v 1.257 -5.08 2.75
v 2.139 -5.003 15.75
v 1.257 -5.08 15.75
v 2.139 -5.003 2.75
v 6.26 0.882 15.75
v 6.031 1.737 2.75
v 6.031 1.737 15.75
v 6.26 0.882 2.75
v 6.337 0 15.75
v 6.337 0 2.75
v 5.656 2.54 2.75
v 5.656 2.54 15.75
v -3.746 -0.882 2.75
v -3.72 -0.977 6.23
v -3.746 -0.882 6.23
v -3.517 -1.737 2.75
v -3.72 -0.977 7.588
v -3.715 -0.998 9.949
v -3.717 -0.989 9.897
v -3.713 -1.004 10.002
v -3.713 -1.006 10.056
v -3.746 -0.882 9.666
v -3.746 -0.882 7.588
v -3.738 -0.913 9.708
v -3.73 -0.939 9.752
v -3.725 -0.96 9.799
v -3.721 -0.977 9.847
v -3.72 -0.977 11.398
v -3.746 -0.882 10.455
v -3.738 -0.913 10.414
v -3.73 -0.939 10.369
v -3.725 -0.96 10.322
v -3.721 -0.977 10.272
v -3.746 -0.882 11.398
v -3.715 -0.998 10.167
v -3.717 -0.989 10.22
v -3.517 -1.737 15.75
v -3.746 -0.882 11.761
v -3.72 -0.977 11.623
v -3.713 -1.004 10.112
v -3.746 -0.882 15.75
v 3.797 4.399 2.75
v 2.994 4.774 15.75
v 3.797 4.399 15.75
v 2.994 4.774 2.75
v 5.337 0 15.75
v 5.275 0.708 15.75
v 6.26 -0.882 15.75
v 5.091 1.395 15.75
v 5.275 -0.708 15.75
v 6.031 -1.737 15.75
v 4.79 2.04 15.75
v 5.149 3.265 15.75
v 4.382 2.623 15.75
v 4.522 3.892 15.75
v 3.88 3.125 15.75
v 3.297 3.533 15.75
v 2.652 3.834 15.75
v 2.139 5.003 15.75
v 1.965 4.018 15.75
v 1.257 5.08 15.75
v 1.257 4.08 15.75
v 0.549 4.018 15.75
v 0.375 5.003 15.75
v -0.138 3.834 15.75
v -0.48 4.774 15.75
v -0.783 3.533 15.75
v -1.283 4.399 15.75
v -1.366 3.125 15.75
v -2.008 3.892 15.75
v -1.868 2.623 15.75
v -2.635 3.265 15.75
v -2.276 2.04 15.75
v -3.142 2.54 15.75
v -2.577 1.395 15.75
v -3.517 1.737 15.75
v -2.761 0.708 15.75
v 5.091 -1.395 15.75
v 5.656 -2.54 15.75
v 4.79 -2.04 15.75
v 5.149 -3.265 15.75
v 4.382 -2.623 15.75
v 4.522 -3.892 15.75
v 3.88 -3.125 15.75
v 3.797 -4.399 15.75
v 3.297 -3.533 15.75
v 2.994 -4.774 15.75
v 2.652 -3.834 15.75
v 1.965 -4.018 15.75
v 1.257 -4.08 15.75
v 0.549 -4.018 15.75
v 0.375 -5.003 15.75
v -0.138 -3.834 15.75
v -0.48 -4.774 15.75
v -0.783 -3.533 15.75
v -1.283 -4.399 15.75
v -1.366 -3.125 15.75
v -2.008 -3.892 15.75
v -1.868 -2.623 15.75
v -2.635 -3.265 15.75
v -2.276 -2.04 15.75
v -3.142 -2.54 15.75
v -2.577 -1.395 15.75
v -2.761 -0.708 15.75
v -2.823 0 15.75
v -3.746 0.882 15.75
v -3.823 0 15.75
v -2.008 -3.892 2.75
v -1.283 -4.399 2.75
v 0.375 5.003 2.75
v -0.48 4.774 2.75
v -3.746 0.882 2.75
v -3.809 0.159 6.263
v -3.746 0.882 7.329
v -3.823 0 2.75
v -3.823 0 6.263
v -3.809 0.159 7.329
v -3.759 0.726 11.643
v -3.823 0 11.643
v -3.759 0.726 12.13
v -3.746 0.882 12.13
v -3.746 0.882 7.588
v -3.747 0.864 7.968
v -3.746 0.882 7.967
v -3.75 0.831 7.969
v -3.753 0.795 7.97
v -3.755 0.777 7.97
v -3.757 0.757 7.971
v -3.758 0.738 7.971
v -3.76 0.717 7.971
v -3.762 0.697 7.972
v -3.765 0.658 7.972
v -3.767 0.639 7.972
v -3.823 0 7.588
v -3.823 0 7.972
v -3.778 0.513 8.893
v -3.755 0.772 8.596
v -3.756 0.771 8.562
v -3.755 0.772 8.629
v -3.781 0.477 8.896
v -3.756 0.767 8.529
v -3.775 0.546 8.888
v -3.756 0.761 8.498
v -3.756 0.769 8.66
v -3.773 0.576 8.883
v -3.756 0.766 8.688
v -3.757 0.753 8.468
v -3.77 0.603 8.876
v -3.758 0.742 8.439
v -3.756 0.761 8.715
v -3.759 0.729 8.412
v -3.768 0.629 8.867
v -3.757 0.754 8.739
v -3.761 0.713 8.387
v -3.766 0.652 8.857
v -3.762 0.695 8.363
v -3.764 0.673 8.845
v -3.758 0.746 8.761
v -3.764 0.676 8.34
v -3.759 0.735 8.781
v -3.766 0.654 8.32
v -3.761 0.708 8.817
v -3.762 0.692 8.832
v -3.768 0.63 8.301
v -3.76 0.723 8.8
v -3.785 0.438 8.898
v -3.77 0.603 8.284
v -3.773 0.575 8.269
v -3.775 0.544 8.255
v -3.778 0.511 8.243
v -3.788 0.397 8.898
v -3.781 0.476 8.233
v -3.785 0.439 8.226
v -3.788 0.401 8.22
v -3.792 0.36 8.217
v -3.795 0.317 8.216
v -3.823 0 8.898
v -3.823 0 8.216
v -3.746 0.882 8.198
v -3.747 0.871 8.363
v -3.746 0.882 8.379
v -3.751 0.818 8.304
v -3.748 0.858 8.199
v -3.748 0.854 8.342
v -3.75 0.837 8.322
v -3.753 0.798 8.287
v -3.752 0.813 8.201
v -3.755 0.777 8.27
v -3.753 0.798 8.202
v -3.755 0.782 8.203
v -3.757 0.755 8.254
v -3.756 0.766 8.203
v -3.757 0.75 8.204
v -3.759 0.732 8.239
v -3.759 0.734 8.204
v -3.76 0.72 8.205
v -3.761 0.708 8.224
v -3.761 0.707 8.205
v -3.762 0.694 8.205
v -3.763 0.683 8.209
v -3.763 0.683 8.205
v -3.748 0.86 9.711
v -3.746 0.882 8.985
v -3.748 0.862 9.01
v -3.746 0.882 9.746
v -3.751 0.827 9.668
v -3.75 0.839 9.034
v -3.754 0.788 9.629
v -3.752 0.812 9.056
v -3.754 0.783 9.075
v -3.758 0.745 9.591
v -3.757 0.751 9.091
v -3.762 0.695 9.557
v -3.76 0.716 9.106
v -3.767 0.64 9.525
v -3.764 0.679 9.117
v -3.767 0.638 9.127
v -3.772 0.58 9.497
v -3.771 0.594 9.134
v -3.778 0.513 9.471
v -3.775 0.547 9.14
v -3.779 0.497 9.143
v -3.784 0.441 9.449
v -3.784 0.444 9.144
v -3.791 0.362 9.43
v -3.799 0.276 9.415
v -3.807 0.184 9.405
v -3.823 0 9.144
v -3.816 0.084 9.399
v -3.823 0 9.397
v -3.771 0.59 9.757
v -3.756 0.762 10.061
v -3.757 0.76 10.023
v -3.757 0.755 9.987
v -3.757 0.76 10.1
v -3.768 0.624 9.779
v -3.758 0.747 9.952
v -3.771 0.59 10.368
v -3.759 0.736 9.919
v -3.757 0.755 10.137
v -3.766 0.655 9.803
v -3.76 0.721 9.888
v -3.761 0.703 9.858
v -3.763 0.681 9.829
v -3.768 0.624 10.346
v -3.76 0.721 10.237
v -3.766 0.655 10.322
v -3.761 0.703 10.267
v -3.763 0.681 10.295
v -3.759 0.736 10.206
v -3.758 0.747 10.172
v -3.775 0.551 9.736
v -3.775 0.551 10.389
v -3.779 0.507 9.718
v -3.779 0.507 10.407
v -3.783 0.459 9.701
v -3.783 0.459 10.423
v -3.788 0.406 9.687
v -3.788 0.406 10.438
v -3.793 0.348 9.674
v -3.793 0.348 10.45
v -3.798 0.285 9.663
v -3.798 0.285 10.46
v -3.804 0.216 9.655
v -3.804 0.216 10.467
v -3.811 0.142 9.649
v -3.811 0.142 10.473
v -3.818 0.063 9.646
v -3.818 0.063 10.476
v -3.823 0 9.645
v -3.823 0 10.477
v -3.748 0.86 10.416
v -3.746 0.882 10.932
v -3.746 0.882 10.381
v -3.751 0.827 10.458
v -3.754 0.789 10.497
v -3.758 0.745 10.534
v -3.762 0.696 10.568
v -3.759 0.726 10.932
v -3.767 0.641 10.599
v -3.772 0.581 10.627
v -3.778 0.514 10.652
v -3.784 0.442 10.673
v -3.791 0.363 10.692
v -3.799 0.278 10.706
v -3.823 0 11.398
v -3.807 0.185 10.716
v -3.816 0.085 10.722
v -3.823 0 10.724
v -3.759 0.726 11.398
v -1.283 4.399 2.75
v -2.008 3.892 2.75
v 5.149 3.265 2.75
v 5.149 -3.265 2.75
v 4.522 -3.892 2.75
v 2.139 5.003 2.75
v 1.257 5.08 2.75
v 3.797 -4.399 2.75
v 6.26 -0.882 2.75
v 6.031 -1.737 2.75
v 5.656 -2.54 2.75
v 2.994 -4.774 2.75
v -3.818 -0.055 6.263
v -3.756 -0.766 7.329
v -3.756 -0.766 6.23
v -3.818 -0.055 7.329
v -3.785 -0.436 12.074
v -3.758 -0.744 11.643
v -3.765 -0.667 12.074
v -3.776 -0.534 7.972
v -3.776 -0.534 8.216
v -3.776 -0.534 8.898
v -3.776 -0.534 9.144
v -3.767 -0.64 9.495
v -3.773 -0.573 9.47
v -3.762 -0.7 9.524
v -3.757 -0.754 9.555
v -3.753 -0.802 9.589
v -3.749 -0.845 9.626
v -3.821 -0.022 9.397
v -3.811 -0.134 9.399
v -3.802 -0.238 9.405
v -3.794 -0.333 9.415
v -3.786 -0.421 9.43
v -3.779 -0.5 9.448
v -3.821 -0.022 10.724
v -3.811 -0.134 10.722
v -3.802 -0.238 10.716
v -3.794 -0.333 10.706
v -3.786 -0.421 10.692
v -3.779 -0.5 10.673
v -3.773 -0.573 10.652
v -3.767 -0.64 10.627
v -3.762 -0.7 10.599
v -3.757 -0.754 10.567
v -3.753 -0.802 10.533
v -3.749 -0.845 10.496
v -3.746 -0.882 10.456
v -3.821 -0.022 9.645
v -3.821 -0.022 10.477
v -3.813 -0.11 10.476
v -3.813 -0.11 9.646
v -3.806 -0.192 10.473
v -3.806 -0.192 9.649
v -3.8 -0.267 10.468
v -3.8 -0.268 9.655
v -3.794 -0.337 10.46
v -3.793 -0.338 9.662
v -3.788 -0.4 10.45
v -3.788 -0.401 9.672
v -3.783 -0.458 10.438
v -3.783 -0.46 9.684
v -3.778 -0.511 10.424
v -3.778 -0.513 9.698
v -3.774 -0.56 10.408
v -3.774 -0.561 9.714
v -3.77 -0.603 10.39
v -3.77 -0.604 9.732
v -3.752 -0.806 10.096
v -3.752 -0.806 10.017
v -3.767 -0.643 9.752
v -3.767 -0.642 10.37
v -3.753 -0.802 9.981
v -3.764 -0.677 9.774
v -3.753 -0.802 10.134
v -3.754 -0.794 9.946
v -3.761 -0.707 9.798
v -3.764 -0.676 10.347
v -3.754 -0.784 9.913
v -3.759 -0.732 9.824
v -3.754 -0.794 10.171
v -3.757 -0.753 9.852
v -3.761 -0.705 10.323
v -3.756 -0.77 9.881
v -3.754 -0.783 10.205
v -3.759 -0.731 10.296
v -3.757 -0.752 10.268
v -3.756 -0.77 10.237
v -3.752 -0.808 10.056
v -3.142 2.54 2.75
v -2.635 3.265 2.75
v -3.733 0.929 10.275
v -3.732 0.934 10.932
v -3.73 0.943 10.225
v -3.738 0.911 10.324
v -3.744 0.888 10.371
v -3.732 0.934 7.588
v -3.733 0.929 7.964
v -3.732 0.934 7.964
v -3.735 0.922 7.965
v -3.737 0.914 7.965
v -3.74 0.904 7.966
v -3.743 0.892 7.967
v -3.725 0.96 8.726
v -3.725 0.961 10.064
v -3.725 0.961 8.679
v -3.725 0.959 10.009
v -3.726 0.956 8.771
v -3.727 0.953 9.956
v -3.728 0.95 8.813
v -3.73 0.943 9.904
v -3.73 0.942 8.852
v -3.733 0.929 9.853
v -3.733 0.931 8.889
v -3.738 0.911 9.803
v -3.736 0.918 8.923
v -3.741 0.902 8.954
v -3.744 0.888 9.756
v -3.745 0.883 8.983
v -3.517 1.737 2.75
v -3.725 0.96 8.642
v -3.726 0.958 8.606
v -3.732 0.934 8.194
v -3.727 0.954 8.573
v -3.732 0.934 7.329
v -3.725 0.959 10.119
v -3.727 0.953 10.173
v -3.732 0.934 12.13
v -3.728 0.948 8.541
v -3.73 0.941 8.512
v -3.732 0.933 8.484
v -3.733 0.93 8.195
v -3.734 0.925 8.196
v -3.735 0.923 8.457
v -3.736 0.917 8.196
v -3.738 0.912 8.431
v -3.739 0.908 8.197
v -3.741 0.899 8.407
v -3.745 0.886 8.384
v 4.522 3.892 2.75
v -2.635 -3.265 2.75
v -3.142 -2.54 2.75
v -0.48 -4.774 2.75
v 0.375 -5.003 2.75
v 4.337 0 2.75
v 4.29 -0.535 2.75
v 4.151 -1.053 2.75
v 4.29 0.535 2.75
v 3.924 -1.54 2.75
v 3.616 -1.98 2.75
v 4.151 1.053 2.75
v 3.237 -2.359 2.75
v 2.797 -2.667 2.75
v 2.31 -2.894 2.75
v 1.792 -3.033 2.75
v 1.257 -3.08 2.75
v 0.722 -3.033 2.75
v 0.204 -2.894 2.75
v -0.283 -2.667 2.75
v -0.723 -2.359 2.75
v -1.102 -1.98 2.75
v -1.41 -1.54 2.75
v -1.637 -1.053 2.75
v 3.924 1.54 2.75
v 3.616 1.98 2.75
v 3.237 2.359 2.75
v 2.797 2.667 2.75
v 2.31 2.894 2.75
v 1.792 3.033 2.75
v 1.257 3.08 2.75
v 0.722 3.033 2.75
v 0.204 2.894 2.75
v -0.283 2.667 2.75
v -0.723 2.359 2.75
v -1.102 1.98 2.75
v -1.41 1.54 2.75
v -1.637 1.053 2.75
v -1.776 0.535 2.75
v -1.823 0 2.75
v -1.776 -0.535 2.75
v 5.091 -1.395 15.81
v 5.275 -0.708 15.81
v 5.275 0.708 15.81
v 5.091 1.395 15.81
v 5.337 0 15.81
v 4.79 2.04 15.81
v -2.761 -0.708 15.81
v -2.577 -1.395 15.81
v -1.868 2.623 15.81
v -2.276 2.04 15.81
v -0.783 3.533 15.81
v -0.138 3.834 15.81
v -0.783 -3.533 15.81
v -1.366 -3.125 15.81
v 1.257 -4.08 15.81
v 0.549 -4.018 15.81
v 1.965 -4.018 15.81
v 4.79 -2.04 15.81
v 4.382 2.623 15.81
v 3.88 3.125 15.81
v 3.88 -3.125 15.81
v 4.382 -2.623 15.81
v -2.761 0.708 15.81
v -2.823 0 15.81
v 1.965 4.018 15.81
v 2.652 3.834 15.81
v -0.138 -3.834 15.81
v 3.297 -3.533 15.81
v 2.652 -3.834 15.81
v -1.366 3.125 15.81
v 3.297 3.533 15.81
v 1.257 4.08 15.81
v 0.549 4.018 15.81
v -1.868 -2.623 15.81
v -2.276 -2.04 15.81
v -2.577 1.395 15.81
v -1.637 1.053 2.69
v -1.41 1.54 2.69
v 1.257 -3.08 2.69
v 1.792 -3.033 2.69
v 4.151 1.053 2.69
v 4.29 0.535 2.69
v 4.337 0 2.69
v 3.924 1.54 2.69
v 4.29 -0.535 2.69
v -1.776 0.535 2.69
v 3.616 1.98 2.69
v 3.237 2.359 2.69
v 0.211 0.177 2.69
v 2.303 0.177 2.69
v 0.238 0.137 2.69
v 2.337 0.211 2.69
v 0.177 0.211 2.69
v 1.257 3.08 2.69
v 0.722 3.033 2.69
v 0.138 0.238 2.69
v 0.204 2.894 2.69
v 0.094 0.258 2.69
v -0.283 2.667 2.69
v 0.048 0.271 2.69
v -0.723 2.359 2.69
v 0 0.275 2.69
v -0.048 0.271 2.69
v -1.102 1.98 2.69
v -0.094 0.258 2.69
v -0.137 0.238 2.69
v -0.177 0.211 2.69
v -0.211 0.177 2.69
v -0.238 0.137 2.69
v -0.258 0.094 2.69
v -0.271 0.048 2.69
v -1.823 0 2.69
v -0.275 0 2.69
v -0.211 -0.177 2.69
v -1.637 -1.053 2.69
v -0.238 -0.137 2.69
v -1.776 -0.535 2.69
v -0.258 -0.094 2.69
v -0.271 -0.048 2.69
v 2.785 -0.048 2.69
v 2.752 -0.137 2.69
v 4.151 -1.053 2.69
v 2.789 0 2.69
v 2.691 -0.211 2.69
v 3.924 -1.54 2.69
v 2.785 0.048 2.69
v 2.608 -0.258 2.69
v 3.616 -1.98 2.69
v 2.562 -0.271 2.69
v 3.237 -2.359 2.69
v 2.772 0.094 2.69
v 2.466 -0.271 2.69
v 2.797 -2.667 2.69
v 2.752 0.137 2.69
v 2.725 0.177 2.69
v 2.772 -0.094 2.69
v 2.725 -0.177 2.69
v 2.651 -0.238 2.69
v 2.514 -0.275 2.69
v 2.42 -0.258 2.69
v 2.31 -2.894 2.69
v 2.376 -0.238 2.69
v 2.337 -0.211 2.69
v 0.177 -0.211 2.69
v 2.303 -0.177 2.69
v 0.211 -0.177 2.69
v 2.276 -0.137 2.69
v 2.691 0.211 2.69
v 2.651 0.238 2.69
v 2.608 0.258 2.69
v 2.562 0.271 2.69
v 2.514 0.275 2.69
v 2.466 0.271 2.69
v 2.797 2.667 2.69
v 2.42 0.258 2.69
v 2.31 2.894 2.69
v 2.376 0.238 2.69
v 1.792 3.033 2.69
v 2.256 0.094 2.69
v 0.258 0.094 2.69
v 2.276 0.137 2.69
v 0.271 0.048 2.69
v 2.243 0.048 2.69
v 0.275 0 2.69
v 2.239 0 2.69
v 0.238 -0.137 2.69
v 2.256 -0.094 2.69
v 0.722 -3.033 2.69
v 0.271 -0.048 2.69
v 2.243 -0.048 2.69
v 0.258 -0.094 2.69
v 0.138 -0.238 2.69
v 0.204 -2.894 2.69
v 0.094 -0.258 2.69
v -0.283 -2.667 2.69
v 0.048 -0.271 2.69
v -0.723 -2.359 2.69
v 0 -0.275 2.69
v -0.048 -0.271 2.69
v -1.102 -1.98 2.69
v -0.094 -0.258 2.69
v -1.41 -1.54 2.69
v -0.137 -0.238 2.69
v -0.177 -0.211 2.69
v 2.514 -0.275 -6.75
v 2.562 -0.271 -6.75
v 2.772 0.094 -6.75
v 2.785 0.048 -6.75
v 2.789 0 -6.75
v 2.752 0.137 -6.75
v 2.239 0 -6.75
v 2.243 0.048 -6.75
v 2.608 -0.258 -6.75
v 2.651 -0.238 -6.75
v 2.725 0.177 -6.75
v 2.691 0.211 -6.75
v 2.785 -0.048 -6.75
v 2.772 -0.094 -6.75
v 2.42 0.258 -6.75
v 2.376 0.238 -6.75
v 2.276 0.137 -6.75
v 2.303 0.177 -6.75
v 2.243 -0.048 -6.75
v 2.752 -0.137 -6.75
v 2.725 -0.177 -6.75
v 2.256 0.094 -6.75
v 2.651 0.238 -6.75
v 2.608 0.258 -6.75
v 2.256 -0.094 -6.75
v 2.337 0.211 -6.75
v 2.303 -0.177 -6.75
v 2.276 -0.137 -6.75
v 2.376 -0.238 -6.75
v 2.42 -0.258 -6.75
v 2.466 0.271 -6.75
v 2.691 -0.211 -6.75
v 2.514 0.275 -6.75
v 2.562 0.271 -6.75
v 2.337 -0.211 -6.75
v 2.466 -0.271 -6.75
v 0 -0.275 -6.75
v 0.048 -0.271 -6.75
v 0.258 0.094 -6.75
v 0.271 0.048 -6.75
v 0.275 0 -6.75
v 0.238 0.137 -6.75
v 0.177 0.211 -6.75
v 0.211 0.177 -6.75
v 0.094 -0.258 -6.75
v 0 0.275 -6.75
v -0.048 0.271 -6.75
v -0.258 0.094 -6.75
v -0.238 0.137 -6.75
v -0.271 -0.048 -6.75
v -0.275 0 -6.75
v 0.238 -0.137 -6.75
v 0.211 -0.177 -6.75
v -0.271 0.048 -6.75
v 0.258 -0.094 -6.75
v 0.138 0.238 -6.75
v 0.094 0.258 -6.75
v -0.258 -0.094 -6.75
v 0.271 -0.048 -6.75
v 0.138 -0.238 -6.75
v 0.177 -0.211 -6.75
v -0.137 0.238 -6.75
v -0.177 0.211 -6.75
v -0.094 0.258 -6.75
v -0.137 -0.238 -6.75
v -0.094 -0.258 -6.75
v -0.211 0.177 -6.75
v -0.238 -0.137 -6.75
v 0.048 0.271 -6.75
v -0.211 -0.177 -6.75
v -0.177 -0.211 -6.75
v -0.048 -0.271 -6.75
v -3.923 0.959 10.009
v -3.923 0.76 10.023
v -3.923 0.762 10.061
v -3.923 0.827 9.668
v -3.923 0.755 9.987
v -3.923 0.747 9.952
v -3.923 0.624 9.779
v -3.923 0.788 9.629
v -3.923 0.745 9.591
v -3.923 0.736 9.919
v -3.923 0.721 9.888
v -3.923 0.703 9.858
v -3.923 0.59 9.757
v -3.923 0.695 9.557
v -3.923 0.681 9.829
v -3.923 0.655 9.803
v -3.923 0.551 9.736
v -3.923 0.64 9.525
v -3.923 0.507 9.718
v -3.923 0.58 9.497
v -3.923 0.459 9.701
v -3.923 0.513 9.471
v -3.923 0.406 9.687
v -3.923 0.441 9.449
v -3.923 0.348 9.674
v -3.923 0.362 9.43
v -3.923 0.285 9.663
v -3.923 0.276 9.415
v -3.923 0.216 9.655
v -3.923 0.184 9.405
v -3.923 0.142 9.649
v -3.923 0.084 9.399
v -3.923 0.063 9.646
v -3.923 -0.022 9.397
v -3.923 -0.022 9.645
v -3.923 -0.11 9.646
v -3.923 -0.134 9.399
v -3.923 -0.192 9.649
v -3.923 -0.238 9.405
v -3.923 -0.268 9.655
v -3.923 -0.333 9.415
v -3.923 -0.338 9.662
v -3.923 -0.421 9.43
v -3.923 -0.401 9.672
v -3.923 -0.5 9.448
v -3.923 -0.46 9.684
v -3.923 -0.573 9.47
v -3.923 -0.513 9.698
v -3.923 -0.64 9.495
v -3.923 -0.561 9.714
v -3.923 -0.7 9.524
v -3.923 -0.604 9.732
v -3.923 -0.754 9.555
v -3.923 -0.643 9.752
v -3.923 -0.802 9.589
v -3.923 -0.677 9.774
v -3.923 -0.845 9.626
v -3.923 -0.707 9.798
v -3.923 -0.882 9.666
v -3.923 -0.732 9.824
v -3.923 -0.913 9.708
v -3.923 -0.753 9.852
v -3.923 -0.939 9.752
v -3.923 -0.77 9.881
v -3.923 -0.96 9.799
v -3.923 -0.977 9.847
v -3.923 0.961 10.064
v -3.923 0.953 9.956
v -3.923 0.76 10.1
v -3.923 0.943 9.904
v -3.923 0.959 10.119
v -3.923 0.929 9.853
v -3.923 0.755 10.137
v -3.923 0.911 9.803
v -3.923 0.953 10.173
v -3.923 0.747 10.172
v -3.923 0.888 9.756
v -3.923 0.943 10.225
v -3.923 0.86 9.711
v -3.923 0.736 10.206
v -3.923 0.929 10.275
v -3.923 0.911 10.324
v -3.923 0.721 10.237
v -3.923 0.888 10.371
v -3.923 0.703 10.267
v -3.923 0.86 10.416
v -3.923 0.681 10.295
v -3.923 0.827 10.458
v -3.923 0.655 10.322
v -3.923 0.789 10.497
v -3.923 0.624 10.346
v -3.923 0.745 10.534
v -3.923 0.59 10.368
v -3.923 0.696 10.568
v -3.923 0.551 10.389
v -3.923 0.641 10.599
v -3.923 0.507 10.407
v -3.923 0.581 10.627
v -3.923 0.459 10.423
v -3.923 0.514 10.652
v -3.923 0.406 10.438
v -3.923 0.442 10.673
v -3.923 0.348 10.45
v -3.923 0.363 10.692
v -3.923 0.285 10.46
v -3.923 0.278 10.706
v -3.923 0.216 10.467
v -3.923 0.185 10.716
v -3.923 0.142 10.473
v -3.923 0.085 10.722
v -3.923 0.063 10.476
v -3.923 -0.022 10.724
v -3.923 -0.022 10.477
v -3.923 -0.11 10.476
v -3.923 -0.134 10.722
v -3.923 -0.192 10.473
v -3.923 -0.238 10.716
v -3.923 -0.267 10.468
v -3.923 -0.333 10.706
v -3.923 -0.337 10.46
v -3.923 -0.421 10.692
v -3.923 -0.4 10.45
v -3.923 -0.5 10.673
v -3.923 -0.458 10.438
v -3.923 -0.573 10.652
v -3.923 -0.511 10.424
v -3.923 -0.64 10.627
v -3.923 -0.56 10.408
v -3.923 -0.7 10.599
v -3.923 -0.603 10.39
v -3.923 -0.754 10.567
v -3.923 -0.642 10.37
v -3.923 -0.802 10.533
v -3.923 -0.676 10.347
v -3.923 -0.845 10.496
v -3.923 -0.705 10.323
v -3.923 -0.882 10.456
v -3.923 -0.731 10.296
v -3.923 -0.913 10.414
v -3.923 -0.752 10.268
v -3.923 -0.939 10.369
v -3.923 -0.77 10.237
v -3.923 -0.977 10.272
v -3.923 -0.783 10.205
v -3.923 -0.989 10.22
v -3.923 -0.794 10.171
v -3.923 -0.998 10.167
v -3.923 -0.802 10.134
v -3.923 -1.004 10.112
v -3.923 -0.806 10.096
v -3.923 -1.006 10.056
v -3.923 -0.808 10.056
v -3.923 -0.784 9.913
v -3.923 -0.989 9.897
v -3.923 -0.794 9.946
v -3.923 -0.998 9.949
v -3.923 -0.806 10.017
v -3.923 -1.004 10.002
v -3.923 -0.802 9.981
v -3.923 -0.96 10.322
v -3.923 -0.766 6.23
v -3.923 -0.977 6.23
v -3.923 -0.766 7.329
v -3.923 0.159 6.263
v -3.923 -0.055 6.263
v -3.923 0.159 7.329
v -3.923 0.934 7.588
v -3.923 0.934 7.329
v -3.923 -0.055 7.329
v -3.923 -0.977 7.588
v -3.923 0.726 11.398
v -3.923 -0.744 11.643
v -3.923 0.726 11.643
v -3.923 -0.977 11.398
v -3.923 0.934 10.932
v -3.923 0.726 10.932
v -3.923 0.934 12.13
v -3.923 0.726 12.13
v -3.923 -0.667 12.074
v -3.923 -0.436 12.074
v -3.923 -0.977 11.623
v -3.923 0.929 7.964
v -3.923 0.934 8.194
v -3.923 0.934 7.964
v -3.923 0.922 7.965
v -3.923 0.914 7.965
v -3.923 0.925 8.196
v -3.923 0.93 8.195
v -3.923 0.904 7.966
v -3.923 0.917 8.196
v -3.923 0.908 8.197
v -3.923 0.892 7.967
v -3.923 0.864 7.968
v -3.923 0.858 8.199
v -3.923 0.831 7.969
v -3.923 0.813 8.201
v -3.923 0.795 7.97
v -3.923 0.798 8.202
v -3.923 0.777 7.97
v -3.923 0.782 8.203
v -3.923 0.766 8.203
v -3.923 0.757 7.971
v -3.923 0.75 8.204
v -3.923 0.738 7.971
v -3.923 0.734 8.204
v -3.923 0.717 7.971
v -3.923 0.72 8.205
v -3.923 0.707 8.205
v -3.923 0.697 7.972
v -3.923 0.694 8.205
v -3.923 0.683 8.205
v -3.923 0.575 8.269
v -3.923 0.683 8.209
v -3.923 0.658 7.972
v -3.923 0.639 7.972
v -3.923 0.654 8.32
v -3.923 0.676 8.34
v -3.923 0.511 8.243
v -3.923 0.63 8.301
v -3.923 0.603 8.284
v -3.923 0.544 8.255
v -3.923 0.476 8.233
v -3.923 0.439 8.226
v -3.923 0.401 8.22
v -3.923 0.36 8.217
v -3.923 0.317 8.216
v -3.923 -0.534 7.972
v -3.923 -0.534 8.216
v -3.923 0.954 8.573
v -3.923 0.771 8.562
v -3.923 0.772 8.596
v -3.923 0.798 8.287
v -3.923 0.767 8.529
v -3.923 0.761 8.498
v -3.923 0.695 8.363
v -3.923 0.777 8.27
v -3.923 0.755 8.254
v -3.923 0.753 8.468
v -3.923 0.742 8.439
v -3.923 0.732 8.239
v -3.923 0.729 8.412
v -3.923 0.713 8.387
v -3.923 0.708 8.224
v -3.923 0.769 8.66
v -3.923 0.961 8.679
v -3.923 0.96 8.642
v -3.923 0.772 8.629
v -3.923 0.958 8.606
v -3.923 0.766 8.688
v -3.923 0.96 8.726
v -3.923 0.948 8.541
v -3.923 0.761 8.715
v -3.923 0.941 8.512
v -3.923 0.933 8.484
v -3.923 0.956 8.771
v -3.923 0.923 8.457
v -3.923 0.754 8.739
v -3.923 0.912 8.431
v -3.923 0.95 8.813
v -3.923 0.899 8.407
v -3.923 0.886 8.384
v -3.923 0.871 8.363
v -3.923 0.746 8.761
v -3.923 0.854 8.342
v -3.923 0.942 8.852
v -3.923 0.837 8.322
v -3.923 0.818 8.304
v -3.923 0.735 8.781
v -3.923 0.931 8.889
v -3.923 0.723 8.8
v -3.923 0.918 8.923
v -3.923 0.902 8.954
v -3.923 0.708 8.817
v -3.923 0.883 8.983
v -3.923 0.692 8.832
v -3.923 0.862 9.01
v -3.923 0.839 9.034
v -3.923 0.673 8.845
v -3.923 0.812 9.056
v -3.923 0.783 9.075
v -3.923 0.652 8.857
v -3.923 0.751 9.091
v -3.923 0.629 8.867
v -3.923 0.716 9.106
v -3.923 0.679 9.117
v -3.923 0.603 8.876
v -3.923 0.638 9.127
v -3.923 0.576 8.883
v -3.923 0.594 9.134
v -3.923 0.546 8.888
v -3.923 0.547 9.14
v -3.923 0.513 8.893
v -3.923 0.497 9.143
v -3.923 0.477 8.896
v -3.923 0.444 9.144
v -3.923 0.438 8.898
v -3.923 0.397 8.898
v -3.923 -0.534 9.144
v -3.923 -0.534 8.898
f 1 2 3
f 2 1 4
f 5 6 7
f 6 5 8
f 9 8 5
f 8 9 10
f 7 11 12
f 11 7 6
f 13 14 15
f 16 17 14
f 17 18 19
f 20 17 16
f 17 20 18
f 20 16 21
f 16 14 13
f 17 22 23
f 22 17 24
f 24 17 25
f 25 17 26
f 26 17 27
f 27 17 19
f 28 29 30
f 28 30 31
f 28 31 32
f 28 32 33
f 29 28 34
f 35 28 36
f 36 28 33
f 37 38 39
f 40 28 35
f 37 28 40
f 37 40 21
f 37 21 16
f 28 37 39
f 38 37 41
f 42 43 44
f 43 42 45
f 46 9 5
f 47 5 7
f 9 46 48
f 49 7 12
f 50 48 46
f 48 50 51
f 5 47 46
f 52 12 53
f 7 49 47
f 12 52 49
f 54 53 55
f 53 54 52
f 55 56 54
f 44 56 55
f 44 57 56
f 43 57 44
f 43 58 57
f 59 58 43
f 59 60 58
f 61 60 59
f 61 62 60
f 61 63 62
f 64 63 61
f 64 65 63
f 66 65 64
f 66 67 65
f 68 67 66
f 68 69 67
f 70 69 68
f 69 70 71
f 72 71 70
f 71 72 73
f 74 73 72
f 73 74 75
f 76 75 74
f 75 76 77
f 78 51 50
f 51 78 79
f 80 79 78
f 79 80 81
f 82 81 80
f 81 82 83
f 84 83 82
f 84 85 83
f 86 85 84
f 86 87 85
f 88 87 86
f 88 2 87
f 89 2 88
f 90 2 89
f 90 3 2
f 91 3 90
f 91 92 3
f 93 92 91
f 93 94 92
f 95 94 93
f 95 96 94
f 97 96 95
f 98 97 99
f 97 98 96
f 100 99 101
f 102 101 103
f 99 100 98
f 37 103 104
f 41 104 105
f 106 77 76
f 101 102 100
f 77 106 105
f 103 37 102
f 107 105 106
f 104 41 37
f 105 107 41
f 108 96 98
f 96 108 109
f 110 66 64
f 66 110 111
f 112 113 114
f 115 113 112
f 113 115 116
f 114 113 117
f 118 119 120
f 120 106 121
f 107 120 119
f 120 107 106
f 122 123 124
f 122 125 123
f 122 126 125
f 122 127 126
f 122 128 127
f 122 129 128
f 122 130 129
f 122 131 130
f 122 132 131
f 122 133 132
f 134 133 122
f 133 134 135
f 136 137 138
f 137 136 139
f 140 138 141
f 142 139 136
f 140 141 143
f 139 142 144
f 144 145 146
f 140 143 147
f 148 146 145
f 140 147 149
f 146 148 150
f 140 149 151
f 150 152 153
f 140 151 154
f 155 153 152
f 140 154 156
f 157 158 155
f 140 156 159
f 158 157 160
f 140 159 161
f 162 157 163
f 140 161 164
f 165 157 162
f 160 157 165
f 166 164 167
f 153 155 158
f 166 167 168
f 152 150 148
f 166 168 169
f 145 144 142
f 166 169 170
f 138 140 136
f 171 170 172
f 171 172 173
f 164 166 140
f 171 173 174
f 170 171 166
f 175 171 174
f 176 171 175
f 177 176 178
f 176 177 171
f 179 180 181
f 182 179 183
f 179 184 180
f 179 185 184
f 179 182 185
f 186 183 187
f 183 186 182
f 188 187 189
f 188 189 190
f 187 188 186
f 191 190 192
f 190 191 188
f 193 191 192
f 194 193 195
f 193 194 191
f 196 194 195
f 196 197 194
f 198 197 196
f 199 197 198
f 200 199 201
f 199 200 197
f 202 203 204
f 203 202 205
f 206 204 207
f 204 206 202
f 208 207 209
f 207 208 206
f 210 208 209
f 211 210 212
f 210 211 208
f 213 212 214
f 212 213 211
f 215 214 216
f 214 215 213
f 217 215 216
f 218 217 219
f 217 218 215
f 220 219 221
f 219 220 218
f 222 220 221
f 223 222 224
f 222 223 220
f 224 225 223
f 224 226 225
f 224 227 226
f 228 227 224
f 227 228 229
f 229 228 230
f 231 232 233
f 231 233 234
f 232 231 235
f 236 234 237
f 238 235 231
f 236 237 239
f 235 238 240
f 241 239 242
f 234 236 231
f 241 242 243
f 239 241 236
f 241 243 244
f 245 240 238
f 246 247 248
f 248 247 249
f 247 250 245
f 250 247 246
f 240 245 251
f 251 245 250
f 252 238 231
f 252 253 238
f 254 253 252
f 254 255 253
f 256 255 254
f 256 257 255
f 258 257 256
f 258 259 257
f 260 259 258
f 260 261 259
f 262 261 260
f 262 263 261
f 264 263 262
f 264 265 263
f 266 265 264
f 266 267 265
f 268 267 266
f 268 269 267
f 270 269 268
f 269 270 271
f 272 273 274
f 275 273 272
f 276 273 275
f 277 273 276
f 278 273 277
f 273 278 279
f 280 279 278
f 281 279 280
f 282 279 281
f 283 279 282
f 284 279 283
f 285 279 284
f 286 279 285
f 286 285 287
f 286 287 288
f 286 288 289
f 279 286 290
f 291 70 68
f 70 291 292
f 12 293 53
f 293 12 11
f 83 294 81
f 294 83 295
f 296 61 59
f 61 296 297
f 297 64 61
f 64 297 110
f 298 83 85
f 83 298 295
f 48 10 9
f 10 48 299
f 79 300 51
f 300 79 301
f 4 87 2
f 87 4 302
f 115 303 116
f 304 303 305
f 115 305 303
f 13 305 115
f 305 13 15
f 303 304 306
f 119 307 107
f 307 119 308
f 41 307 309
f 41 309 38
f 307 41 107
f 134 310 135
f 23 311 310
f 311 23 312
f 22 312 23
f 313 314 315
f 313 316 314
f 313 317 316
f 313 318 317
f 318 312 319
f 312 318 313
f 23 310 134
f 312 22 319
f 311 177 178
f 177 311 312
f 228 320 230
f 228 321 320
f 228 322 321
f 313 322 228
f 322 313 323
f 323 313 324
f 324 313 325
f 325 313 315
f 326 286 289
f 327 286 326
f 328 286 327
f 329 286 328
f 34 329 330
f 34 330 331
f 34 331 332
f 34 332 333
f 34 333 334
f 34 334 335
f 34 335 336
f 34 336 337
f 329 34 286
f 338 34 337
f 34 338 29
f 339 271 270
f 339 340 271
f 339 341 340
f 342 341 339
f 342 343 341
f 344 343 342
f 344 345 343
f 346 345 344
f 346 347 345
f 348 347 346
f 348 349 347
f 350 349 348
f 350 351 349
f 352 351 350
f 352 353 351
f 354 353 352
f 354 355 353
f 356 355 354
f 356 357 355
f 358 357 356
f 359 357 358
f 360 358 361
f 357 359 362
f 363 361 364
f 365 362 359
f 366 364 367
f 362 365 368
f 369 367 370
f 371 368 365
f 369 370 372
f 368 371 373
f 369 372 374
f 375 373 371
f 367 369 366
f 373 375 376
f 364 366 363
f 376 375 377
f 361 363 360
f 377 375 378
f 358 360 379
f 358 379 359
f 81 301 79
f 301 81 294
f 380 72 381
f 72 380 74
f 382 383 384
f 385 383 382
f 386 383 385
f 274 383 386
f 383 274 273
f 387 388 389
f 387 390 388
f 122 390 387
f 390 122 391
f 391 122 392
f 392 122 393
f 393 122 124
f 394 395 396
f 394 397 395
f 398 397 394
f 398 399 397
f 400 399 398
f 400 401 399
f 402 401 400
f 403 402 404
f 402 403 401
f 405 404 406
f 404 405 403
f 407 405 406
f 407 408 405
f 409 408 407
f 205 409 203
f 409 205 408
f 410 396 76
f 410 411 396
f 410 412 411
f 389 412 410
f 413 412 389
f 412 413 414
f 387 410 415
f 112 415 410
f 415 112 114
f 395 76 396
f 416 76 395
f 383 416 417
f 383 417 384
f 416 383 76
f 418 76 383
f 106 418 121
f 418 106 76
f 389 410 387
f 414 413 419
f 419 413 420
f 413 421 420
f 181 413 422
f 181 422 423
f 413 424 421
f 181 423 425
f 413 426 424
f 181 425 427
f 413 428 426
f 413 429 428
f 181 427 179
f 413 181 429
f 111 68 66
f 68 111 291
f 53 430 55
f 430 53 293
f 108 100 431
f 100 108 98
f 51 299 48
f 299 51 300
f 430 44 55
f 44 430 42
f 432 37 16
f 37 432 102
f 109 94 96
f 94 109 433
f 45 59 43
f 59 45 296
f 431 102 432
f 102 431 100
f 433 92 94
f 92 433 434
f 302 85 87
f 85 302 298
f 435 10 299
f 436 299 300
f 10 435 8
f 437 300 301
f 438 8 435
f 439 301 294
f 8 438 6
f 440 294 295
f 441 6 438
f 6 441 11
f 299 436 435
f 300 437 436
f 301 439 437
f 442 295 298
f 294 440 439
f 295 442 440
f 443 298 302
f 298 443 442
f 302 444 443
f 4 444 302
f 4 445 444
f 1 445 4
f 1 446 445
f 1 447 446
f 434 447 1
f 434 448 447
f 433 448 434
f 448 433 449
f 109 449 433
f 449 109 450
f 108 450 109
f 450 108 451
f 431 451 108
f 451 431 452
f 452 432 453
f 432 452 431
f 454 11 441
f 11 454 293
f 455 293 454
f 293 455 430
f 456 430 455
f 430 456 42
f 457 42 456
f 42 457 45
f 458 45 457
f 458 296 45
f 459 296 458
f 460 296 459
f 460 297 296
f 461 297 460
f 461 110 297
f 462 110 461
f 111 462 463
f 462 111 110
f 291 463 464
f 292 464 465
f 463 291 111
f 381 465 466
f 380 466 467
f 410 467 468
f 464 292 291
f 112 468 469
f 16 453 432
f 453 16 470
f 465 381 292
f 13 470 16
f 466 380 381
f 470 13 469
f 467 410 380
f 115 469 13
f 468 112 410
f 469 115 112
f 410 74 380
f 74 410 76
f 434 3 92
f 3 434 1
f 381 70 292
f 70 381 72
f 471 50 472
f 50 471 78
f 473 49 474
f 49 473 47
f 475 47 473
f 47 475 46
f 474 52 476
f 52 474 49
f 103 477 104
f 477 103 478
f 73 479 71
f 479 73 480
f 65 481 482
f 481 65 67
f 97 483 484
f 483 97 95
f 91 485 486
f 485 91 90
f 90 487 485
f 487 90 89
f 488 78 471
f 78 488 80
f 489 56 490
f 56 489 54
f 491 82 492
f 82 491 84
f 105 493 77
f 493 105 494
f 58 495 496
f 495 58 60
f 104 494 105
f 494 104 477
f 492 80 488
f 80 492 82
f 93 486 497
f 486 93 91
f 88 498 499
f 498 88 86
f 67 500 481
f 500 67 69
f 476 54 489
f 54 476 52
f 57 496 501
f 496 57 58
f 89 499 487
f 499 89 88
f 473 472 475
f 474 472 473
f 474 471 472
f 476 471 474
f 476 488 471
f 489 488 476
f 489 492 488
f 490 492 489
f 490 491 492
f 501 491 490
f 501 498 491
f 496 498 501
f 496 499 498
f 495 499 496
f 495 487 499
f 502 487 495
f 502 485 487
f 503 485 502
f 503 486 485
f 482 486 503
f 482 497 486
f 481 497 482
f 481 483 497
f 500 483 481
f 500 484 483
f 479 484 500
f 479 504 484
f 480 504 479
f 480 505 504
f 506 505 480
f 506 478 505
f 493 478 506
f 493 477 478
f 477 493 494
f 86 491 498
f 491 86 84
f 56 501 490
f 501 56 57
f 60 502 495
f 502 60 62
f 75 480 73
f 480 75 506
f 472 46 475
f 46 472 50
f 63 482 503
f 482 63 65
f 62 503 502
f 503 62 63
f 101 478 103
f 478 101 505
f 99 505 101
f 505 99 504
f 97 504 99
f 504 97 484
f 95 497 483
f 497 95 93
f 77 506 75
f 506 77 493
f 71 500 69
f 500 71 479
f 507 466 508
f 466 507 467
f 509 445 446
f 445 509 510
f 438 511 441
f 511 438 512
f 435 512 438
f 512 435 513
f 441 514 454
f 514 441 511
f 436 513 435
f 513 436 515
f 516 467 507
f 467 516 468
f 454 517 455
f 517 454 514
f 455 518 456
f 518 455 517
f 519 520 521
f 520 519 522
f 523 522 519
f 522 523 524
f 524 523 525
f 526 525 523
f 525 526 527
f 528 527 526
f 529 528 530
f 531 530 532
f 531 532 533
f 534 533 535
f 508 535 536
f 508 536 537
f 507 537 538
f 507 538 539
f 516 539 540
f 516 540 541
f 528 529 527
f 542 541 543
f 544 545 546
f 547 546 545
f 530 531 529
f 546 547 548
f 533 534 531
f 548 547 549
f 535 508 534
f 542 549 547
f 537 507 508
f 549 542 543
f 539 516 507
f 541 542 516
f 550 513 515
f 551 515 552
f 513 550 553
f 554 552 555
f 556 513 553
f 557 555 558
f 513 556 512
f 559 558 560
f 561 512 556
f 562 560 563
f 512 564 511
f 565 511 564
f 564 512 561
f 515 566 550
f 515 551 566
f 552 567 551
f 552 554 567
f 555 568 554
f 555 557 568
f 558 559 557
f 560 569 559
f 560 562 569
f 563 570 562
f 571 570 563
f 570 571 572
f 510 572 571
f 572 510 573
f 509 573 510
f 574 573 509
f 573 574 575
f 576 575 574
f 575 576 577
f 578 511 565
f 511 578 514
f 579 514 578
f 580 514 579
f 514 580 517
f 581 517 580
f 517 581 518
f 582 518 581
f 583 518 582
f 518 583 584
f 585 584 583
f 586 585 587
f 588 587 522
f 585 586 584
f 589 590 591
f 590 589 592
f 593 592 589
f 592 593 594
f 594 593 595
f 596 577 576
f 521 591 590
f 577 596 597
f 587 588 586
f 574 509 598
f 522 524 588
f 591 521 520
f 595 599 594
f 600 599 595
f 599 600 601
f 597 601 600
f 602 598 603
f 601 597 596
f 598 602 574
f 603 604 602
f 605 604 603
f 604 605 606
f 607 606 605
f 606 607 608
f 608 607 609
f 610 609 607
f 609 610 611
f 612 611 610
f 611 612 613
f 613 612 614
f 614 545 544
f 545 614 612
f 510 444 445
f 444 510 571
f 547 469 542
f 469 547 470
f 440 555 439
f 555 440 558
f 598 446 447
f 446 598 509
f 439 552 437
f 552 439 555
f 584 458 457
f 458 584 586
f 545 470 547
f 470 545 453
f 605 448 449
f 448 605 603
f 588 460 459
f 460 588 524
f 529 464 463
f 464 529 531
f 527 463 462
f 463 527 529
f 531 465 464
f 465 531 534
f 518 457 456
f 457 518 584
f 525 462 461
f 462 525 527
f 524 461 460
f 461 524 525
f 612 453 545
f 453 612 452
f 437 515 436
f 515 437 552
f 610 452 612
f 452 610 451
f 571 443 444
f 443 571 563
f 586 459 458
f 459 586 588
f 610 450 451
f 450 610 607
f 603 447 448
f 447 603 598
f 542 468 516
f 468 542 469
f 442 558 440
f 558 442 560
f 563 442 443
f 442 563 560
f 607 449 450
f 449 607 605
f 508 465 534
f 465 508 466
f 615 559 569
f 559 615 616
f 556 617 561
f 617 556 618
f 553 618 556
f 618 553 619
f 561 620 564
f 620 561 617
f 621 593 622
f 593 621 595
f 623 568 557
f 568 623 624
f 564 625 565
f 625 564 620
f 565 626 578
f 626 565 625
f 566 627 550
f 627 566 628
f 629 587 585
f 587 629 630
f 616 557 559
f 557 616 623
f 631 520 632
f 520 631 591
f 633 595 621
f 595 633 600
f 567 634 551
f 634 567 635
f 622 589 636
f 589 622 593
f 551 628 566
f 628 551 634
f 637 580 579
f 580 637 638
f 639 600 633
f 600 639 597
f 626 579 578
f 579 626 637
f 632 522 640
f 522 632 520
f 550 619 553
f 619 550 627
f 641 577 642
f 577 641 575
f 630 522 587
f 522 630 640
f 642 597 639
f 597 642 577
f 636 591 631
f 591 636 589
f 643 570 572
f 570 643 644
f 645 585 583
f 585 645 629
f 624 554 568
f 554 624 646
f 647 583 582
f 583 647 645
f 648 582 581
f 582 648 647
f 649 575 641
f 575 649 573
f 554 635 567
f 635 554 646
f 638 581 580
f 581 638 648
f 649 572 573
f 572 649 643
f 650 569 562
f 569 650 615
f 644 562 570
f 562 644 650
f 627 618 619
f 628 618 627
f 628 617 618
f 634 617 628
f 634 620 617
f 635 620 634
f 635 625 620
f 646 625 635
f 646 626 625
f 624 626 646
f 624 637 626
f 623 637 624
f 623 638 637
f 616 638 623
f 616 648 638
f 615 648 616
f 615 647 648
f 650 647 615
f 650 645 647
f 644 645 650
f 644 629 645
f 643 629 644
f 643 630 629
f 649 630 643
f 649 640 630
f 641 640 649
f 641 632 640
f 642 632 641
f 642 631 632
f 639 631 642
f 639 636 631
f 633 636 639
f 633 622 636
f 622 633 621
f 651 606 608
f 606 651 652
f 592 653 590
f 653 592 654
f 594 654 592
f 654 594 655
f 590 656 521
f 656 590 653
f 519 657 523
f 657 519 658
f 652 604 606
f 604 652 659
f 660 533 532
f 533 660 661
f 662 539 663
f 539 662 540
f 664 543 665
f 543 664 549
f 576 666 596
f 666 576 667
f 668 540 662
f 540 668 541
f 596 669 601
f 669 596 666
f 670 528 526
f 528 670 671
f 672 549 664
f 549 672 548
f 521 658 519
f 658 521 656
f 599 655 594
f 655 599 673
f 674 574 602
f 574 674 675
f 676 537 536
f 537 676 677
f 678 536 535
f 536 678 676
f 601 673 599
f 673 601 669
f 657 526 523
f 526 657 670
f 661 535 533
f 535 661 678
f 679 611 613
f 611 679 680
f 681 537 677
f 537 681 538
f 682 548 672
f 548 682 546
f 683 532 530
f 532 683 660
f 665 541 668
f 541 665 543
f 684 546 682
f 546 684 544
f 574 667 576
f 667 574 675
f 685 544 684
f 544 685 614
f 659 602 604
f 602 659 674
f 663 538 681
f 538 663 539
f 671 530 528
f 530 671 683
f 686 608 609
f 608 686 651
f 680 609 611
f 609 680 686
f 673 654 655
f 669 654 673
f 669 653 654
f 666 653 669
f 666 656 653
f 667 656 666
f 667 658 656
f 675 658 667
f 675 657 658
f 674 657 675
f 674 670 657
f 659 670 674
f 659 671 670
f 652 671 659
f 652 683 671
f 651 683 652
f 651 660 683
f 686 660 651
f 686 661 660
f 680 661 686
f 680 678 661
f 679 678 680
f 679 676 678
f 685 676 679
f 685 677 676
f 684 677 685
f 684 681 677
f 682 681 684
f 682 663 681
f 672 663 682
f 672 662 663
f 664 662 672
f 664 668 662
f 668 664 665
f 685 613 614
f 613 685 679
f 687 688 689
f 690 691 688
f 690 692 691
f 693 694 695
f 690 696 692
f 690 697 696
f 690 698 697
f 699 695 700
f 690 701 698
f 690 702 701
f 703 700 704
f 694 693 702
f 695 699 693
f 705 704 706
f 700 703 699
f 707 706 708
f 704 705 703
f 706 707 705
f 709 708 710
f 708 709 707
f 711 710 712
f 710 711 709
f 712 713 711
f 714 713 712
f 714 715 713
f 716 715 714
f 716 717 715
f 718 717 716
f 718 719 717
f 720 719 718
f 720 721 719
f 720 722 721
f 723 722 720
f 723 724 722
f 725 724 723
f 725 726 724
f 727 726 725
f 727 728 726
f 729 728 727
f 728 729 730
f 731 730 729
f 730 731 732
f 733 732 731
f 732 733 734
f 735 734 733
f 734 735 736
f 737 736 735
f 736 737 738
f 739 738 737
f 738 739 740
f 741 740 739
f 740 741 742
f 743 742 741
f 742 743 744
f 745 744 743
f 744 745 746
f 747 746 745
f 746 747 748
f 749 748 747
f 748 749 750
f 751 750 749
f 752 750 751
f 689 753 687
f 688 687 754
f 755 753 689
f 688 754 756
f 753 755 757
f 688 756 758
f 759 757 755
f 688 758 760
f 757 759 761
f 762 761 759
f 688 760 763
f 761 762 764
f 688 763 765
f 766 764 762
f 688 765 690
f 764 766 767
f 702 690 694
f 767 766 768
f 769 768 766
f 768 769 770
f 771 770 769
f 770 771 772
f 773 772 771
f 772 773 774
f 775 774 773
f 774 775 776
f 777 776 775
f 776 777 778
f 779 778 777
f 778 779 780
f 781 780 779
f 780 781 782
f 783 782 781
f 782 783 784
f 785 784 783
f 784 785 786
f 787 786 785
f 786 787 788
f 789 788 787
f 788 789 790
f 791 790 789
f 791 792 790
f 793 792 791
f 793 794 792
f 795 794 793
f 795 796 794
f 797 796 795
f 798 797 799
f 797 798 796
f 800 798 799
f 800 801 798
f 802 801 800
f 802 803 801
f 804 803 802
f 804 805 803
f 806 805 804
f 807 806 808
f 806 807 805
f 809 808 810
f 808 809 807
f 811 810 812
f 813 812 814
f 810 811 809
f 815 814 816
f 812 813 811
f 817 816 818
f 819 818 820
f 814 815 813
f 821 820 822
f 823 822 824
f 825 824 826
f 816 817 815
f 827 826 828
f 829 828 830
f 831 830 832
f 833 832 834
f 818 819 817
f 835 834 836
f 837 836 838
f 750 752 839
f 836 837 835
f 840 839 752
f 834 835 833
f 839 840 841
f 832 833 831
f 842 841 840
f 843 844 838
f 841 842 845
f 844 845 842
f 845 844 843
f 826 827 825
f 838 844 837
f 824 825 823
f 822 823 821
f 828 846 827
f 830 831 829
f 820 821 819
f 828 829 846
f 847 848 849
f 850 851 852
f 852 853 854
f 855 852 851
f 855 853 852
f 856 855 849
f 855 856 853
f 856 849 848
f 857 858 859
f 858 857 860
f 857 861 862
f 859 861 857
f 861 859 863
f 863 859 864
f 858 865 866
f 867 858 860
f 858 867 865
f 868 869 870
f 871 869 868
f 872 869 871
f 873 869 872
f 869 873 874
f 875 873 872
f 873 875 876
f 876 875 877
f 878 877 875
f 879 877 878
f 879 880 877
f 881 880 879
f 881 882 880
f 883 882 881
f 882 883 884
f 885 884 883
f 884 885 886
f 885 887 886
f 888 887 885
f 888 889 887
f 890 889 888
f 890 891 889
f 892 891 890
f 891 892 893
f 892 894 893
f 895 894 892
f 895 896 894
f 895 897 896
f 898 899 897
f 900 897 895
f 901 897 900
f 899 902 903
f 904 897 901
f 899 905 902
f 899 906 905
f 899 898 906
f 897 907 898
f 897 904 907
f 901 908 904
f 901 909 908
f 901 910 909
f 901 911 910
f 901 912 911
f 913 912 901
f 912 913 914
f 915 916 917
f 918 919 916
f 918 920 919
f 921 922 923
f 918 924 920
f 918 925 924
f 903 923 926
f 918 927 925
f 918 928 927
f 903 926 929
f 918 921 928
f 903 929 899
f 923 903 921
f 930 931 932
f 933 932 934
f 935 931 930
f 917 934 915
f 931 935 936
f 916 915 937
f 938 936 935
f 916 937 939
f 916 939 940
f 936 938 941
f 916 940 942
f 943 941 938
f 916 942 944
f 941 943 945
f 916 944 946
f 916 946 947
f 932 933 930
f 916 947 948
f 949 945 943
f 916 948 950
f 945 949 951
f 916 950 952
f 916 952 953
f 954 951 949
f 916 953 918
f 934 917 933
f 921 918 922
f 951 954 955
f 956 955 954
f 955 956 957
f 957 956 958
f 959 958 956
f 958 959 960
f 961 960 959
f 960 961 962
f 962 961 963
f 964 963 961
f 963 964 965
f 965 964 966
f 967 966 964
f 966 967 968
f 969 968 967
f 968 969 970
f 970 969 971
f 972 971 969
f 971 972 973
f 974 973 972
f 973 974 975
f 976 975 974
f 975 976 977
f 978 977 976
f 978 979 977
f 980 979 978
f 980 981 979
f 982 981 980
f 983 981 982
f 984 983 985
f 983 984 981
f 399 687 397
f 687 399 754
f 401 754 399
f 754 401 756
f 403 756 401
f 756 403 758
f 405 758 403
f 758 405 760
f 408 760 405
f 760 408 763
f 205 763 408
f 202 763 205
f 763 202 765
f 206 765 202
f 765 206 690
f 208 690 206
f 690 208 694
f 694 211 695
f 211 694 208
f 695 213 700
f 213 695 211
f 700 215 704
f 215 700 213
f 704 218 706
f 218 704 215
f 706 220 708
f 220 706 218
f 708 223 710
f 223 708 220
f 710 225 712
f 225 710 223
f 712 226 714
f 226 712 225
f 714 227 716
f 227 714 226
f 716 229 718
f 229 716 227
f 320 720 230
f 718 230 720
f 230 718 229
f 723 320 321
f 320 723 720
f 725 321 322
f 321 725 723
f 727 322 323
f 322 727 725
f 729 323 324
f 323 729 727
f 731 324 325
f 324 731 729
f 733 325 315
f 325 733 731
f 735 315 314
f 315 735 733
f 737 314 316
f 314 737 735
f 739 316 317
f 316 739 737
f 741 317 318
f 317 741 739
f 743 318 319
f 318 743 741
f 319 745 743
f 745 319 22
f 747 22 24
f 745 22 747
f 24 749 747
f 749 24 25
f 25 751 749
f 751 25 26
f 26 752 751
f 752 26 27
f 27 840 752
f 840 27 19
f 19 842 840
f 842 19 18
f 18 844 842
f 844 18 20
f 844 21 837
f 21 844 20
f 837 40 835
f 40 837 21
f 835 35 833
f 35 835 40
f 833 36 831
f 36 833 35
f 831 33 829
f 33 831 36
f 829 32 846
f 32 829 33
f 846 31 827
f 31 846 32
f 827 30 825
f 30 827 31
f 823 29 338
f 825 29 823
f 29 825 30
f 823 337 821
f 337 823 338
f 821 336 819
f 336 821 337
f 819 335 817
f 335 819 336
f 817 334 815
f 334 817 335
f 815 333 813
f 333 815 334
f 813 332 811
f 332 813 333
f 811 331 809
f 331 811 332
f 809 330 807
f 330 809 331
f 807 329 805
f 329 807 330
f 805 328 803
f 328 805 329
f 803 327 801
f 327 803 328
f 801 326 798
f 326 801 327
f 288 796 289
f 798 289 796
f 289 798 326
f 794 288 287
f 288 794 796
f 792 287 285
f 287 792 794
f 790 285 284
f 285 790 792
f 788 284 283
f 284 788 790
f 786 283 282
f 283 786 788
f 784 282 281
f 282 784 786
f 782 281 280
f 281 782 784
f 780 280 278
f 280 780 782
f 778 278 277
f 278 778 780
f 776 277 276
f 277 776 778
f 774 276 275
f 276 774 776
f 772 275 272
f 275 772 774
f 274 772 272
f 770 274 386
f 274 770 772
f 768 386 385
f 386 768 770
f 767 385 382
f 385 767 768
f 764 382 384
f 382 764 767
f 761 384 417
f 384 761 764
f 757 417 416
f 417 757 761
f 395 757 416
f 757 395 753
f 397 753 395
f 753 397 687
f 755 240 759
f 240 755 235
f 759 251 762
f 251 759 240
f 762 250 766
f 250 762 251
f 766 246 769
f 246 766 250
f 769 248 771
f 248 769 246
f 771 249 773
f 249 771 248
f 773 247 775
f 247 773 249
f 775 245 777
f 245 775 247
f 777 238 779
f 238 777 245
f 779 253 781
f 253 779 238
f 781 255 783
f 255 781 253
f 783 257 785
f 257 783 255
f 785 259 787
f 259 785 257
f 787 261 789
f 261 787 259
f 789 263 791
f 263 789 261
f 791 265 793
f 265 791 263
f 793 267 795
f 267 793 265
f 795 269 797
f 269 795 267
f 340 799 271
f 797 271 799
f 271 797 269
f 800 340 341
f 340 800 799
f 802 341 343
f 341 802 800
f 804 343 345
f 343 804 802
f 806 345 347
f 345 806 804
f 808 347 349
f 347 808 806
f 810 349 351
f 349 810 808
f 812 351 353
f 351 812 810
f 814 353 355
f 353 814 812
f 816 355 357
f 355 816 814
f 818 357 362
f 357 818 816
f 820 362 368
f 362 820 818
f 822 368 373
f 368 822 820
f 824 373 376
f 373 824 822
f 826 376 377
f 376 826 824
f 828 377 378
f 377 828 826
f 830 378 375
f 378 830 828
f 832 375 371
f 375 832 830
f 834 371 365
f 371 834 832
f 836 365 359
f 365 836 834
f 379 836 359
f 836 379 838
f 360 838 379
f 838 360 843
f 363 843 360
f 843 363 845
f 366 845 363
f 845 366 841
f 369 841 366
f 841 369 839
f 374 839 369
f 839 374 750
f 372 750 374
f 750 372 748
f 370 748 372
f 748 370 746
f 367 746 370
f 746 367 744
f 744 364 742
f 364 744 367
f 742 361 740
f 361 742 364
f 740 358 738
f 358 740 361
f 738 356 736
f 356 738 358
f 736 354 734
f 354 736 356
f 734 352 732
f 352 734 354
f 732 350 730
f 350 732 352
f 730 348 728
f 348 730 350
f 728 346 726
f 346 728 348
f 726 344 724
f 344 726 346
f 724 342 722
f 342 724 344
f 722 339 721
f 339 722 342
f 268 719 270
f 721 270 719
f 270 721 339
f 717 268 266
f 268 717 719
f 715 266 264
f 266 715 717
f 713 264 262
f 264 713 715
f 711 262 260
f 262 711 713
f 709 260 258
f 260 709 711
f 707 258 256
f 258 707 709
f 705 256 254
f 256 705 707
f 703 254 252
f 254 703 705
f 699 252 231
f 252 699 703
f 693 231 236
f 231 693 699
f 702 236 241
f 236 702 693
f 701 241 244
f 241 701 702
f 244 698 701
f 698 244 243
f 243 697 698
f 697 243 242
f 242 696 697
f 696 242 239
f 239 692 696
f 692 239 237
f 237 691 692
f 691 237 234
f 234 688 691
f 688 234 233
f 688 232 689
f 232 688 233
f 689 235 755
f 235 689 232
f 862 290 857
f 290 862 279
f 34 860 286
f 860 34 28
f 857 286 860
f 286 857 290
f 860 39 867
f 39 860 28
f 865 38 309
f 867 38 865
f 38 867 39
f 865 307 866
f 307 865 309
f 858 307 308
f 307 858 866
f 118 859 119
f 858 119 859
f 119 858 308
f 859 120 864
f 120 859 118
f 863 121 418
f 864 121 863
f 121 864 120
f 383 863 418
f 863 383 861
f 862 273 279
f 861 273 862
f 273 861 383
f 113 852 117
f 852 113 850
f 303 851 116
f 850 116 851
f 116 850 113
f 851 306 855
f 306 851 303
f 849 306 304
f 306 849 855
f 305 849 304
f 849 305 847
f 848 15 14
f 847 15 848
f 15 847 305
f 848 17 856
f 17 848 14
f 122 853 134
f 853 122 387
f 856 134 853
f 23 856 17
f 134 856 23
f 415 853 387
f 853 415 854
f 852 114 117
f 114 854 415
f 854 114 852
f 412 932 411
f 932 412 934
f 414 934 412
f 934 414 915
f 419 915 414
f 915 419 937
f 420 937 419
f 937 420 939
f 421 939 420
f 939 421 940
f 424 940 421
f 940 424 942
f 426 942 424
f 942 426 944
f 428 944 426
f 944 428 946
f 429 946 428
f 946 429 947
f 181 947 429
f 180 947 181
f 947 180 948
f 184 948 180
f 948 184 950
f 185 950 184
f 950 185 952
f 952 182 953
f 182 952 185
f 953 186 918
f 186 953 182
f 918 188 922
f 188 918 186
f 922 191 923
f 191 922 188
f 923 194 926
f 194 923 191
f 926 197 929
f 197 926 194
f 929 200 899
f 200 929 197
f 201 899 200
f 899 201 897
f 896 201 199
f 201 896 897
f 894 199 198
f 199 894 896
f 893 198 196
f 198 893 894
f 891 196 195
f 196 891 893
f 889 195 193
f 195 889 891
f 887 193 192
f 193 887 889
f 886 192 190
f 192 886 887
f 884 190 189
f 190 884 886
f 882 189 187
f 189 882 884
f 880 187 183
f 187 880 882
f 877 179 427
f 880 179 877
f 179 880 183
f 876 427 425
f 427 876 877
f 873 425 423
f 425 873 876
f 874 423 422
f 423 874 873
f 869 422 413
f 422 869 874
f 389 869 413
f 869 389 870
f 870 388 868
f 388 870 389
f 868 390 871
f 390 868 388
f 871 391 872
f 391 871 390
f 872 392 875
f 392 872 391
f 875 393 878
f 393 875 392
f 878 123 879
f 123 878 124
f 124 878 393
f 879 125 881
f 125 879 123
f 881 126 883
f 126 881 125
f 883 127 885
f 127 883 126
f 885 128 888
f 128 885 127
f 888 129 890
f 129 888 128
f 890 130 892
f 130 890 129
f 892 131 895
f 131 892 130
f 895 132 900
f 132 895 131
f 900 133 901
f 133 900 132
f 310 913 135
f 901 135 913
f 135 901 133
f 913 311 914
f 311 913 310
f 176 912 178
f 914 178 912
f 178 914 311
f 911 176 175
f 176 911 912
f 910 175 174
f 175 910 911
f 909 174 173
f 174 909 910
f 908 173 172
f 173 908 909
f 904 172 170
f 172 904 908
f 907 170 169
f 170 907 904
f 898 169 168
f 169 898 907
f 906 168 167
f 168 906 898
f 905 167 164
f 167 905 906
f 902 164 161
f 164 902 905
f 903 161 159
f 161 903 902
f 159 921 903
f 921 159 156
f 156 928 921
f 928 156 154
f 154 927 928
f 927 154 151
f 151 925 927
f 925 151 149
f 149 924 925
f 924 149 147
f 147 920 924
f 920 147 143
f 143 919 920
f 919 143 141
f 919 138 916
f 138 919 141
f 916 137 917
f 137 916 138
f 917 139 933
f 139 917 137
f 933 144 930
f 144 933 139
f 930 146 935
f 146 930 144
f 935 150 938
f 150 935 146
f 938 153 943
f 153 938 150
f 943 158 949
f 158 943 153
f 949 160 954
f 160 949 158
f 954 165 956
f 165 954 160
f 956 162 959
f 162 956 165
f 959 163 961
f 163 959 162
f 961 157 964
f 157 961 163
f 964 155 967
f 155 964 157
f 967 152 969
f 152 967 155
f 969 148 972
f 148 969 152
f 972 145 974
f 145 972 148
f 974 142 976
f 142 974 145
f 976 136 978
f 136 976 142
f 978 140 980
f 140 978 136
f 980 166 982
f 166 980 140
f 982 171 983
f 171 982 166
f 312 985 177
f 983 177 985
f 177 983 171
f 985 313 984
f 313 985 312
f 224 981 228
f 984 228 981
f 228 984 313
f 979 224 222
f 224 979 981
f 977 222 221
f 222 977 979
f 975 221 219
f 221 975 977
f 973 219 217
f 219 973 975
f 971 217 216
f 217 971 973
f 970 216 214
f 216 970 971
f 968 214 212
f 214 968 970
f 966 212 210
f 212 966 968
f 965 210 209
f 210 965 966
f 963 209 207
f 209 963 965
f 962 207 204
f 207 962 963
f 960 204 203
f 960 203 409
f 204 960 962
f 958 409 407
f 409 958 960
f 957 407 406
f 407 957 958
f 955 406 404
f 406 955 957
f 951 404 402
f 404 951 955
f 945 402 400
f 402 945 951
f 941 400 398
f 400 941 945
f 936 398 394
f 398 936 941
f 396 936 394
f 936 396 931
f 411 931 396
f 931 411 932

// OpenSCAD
$fn=36;
Text="10uF";
Capacitor_diameter=2.54*2;
Capacitor_height=13;
Type=0;  //0=Electrolitic   1=Ceramic    2=Poliester
Solder=0;

module Capacitor(Text,Capacitor_diameter,Capacitor_height,Type,Solder)
  {
  if(Type==0)
  translate([1.257,0,2.75])
    {
  
    color("Black")
      translate([0,0,Capacitor_height/2])
        rotate([0,0,0])
          cylinder(r=Capacitor_diameter,h=Capacitor_height,center=true);

    color("Silver")
      translate([0,0,Capacitor_height+0.01])
        rotate([0,0,0])
          cylinder(r=Capacitor_diameter-1,h=0.1,center=true);

    color("Silver")
      translate([0,0,-0.01])
        rotate([0,0,0])
          cylinder(r=Capacitor_diameter-2,h=0.1,center=true);

    color("Silver")
      translate([1.257,0,-4.5])
        rotate([0,0,0])
          cylinder(d=0.55,h=10,center=true);

    color("Silver")
      translate([-1.257,0,-4.5])
        rotate([0,0,0])
          cylinder(d=0.55,h=10,center=true);
  
    color("White")
      translate([-Capacitor_diameter+0.9,0,Capacitor_height/2])
        rotate([0,0,180])
          rotate([90,90,90])
            linear_extrude(1)
              text(Text,size=2,valign="center",halign="center");

    if(Solder==1)
      {
      color("Silver")
          translate([2.54*0.5,0,-2.25])
            rotate([0,0,0])
              scale([1,1,1.1])
                sphere(d=2);
      color("Silver")
          translate([-2.54*0.5,0,-2.25])
            rotate([0,0,0])
              scale([1,1,1.1])
                sphere(d=2);
      }

    color("White")
      %translate([0.15,0,0])
        intersection()
          {
          translate([Capacitor_diameter/2,0,0])
            rotate([0,0,0])
              cube([Capacitor_diameter,Capacitor_diameter,Capacitor_height*3],center=true);
          color("Black")
            translate([0,0,Capacitor_height/2+0.02])
              rotate([0,0,0])
                cylinder(r=Capacitor_diameter-0.1,h=Capacitor_height,center=true);
         }
      }
  
if(Type==1)
  {
  translate([0,0,2.75])
  {
  color("Sienna")
  hull()
    {
    color("Black")
      translate([0,0,Capacitor_height/2])
        rotate([90,90,0])
          cylinder(r=Capacitor_diameter,h=0.5,center=true);

    difference()
      {
        translate([0,-Capacitor_diameter+1.5,Capacitor_height/2])
          rotate([90,90,0])
            sphere(Capacitor_diameter);

        translate([0,-50,0])
          cube([100,100,100],center=true);
      }

    difference()
      {
        translate([0,Capacitor_diameter-1.5,Capacitor_height/2])
          rotate([90,90,0])
            sphere(Capacitor_diameter);

        translate([0,50,0])
          cube([100,100,100],center=true);
      }
    }

  color("Silver")
    translate([2.54,0,-4.5])
      rotate([0,0,0])
        cylinder(d=0.55,h=20,center=true);

  color("Silver")
    translate([-2.54,0,-4.5])
      rotate([0,0,0])
        cylinder(d=0.55,h=20,center=true);
  
    if(Solder==1)
      {
      color("Silver")
          translate([2.54*1,0,-2.25])
            rotate([0,0,0])
              scale([1,1,1.1])
                sphere(d=2);
      color("Silver")
          translate([-2.54*1,0,-2.25])
            rotate([0,0,0])
              scale([1,1,1.1])
                sphere(d=2);
      }

  color("White")
    translate([0,-0.5,Capacitor_height/2])
        rotate([90,0,0])
      %linear_extrude(1)
        text(Text,size=2,valign="center",halign="center");
  }
}

if(Type==2)
  {
  translate([0,0,2.75])
  {
  color("DodgerBlue")
  hull()
    {
    color("Black")
      translate([0,0,2])
        rotate([0,0,0])
          cube([2.54*3,2.5,2.54*2],center=true);
    }

  color("Silver")
    translate([2.54,0,-4.5])
      rotate([0,0,0])
        cylinder(d=0.55,h=10,center=true);

  color("Silver")
    translate([-2.54,0,-4.5])
      rotate([0,0,0])
        cylinder(d=0.55,h=10,center=true);
  

    if(Solder==1)
      {
      color("Silver")
          translate([2.54*1,0,-2.25])
            rotate([0,0,0])
              scale([1,1,1.1])
                sphere(d=2);
      color("Silver")
          translate([-2.54*1,0,-2.25])
            rotate([0,0,0])
              scale([1,1,1.1])
                sphere(d=2);
      }

  color("White")
    %translate([0,-0.3,2])
        rotate([90,0,0])
          linear_extrude(1)
            text(Text,size=2,valign="center",halign="center");
  }
}
}
               
Capacitor(Text,Capacitor_diameter,Capacitor_height,Type,Solder);
